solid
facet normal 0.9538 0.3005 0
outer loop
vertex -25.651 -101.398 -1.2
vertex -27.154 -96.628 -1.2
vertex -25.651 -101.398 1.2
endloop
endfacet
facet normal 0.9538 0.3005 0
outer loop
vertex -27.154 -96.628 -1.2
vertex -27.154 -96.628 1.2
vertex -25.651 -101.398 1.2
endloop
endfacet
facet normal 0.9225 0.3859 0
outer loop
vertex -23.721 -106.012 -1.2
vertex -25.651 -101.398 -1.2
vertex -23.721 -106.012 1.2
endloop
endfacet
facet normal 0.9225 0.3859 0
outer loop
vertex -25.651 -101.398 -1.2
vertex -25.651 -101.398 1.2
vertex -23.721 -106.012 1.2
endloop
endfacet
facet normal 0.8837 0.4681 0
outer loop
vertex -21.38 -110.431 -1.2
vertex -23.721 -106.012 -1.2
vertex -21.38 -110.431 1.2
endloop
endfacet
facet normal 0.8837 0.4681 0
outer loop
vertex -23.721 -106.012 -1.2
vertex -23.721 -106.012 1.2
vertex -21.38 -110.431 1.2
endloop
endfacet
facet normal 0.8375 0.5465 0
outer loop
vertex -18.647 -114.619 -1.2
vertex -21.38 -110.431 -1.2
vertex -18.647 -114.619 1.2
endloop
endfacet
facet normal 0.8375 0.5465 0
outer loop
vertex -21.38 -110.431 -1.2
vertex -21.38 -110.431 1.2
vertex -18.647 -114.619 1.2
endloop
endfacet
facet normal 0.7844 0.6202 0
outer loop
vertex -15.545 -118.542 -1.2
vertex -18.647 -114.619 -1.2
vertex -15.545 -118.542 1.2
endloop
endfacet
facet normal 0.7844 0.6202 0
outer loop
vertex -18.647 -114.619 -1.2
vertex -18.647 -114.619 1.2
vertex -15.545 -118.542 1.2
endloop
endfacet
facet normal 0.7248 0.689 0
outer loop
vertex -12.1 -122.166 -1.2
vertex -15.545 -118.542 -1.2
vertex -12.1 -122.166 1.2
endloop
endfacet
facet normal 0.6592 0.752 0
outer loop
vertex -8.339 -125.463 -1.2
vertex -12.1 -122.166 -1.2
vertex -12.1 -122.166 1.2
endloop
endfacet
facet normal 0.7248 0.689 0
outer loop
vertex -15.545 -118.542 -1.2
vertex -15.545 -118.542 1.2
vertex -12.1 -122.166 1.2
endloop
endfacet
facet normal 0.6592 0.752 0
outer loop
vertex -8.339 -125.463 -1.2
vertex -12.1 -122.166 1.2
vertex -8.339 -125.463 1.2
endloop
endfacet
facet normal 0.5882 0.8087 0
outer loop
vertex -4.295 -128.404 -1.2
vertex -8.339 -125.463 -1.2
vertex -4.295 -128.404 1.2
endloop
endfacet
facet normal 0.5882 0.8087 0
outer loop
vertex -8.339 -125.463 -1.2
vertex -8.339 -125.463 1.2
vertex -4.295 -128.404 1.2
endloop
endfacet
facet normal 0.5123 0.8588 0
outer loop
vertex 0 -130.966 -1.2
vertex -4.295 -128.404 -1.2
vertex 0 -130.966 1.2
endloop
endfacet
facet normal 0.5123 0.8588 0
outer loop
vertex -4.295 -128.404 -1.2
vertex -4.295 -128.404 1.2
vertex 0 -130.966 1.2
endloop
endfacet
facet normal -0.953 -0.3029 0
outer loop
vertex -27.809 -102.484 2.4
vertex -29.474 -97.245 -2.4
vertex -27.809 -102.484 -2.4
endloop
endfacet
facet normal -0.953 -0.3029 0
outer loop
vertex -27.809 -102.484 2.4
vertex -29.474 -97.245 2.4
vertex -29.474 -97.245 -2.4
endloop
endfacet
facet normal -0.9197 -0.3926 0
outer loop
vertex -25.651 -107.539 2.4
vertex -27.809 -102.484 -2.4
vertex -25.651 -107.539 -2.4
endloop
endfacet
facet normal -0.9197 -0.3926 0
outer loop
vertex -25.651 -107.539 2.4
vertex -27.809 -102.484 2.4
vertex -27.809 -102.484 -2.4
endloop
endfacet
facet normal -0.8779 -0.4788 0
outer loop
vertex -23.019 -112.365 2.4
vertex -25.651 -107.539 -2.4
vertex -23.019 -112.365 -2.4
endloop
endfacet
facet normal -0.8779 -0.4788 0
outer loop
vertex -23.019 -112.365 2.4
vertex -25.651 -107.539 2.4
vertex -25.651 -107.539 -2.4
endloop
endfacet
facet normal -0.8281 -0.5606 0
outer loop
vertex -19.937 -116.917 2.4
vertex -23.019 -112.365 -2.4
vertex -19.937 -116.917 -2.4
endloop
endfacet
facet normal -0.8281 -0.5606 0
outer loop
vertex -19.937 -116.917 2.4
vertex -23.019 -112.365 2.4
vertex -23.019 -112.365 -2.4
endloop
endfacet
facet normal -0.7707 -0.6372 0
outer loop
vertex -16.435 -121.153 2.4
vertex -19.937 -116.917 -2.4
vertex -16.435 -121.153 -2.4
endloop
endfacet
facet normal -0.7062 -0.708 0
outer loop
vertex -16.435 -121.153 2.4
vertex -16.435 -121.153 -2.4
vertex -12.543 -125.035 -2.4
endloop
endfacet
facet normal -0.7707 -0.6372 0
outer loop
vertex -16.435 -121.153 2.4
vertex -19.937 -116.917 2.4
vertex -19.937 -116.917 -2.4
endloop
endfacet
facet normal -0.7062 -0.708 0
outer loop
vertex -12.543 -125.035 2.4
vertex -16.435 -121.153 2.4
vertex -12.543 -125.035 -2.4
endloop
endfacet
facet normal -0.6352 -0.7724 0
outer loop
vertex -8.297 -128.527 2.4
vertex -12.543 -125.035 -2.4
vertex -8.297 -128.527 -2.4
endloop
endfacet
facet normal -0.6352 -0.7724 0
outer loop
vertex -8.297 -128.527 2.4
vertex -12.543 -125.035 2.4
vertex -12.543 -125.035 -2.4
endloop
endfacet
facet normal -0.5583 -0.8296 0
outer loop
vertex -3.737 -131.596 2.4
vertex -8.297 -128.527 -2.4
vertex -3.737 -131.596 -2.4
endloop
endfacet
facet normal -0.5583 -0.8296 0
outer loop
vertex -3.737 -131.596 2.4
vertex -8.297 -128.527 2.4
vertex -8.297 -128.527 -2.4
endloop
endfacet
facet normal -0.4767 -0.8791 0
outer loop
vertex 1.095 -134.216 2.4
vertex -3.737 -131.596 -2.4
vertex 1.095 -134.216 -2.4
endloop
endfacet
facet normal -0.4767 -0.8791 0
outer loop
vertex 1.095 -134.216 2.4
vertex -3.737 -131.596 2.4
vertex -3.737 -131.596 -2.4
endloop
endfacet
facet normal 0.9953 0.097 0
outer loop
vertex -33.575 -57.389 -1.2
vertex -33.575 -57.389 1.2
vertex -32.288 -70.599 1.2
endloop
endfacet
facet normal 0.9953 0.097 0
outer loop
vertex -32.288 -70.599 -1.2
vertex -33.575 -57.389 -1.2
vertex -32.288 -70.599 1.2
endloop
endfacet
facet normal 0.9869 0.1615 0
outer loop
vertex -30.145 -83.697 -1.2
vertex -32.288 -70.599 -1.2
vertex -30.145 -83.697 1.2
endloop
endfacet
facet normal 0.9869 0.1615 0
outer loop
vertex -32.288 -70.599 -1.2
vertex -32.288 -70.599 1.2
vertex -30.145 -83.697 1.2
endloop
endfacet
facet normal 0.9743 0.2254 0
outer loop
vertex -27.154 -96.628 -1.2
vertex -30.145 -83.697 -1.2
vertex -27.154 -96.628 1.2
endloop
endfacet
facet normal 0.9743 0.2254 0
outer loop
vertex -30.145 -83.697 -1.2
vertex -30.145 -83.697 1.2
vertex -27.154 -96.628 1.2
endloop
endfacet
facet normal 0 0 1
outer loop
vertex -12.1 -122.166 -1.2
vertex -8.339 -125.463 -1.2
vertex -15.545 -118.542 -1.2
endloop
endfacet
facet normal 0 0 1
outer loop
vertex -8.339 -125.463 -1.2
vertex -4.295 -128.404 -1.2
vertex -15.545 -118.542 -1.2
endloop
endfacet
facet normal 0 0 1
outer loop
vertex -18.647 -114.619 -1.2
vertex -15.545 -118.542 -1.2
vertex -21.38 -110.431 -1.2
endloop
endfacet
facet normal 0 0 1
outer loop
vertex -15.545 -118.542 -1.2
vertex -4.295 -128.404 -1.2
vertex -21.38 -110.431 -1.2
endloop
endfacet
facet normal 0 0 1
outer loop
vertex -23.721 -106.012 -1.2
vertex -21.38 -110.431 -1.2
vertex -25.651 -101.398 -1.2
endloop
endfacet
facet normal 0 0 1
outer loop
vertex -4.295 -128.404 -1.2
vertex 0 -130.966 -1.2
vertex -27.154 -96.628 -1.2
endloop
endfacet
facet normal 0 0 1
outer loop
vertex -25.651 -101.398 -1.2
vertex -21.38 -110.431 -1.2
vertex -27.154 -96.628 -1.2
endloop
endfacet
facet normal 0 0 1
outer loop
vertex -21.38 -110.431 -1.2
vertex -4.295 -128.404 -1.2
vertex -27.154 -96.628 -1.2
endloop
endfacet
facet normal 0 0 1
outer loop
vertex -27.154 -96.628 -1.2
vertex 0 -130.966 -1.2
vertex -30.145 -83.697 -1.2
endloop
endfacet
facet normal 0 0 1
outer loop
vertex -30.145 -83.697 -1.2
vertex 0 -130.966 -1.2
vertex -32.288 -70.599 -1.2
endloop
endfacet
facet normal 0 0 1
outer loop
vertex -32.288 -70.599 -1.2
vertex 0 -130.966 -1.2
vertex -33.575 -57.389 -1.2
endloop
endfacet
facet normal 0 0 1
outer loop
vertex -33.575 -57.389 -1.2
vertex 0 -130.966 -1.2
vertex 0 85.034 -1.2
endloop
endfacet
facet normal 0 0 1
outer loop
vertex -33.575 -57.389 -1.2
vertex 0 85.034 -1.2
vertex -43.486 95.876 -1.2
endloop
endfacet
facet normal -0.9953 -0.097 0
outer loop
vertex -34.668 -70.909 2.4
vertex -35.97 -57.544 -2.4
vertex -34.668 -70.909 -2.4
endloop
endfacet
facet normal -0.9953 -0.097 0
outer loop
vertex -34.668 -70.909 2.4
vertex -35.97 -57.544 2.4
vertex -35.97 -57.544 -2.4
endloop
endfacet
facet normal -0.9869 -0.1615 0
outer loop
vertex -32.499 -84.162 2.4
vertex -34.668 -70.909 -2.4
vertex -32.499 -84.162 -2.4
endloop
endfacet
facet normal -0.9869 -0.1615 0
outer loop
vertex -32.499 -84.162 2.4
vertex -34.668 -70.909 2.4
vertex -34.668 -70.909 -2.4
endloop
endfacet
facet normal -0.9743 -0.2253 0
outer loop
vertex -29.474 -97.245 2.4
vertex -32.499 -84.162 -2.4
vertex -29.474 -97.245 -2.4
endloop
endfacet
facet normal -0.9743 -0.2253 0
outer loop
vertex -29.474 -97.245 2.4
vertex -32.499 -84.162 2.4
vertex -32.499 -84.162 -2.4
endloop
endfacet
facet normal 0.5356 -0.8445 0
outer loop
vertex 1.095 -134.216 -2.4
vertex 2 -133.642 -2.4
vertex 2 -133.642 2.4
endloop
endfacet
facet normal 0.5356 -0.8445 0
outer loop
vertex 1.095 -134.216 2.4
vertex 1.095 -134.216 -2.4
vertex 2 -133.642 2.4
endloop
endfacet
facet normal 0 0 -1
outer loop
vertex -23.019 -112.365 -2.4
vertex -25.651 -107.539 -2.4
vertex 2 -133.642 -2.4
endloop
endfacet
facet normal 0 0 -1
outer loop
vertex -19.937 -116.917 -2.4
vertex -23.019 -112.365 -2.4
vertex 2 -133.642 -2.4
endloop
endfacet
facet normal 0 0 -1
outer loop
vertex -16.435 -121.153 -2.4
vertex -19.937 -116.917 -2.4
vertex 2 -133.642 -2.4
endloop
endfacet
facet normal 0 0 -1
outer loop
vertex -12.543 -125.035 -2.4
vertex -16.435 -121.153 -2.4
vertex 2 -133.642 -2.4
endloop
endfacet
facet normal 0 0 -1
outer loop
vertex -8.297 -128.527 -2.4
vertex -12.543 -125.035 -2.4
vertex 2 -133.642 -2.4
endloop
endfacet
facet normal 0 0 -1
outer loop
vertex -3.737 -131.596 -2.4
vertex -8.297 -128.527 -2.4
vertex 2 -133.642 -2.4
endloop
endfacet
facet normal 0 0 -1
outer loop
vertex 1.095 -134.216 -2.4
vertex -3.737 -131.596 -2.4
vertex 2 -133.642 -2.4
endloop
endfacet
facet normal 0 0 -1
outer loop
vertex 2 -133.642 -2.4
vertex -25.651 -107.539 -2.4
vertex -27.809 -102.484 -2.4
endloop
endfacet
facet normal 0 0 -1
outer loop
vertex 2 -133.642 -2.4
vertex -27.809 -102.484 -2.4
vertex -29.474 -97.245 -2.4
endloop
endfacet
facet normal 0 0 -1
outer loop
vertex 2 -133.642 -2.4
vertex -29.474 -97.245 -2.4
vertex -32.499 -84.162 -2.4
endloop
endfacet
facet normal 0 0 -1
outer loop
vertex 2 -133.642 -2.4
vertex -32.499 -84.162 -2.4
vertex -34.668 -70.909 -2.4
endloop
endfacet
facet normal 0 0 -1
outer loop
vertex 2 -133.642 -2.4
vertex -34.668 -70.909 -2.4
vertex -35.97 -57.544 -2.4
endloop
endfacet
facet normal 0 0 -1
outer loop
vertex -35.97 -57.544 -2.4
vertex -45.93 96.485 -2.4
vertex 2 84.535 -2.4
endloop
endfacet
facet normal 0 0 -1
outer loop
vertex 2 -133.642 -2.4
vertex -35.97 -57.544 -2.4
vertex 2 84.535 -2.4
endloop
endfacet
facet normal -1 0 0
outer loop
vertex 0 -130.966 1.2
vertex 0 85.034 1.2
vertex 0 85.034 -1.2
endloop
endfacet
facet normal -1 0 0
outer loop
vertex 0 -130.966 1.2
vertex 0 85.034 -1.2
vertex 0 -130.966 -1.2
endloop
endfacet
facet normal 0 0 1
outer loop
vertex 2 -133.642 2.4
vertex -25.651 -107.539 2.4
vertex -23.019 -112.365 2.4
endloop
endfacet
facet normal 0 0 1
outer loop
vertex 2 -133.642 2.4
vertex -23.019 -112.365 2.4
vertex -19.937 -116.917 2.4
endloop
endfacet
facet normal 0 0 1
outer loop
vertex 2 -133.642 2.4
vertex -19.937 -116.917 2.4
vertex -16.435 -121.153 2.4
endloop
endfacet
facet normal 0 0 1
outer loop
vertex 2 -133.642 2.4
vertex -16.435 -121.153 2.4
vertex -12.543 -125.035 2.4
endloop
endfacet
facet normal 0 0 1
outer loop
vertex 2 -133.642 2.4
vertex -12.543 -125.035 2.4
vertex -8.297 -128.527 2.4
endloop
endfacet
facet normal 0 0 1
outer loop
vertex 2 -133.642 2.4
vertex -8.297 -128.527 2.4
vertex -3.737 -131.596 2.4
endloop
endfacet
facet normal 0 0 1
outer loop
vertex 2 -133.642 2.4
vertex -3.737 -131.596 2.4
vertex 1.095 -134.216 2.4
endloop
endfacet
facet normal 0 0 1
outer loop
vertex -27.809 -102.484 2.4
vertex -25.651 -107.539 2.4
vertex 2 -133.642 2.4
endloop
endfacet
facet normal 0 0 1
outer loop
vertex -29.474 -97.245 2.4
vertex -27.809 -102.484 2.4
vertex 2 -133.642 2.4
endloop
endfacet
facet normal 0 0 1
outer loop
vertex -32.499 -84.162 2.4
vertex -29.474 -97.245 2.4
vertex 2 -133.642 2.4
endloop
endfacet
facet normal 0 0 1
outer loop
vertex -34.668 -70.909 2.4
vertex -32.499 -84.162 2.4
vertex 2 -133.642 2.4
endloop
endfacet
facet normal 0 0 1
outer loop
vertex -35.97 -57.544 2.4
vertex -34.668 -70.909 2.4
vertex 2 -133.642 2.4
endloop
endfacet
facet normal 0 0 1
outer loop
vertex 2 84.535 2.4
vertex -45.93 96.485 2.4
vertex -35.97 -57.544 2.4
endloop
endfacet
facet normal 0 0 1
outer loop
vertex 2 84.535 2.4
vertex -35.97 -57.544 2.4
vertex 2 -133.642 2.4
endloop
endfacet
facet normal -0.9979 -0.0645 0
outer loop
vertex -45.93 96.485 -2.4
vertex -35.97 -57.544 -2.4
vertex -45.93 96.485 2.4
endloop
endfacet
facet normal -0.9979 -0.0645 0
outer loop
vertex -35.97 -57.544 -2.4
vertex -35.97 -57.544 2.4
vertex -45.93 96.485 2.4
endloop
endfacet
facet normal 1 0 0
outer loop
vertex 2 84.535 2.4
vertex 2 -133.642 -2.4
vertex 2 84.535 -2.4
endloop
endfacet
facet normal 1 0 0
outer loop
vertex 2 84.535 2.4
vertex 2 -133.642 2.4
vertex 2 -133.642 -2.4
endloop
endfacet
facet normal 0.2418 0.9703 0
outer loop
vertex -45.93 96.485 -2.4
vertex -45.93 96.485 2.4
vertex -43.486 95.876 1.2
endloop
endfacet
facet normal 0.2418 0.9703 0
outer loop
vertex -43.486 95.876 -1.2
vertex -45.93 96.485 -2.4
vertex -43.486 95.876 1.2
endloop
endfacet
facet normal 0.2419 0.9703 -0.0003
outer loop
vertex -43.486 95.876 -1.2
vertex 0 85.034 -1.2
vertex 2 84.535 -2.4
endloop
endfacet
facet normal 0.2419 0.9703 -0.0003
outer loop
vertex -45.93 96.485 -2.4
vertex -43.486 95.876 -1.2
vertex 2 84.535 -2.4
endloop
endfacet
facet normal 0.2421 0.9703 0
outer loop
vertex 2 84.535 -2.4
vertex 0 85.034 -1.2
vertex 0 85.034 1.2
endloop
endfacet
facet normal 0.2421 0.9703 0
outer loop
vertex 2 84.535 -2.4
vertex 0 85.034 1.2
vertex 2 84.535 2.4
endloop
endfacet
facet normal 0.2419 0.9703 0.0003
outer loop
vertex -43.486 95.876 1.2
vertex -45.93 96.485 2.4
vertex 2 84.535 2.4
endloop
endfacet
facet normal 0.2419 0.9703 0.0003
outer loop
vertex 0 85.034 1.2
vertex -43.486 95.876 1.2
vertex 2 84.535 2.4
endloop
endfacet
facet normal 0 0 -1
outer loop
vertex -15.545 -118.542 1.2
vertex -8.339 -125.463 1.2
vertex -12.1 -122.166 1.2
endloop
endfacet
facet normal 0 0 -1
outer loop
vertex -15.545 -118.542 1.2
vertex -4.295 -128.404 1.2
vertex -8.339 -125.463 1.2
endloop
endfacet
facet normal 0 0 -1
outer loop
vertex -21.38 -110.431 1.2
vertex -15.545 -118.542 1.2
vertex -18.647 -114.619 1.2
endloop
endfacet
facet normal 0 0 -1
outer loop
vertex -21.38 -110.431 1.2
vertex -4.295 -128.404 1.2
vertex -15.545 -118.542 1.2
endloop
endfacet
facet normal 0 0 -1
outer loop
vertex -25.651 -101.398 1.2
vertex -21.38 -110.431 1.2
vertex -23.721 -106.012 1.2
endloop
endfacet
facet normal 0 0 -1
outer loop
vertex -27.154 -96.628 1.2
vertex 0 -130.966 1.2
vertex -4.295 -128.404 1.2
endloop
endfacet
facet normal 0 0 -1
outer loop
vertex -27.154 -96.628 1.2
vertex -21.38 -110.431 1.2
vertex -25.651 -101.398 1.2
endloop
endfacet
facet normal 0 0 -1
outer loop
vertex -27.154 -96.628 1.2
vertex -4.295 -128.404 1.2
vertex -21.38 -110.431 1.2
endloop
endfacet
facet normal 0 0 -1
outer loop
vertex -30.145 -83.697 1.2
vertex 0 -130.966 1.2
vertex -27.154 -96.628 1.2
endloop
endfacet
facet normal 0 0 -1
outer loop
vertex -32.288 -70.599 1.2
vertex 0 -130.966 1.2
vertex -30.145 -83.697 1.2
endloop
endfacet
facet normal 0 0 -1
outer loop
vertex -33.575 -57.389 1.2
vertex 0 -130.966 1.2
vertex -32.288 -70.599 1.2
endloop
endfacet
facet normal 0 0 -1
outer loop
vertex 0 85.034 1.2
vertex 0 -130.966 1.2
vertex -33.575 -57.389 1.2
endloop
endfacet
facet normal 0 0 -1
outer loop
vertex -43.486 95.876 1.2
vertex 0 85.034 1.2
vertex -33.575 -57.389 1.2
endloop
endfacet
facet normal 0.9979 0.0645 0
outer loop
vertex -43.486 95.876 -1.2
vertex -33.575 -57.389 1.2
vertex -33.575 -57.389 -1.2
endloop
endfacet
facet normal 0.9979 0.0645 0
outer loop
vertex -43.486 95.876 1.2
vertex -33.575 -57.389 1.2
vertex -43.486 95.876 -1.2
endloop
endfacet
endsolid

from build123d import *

# Parameters (mm, degrees)
PAD_DEPTH    = 2.4
POCKET_DEPTH = 1.2
CHAMFER_SIZE = 1


with BuildPart() as part:
    # Sketch001 → Pad (new body, symmetric)
    with BuildSketch(Plane.XY):
        with BuildLine():
            ThreePointArc((-35.969784, -57.54415), (-33.691358, -77.55321), (-29.473826, -97.244988))
            ThreePointArc((-29.473826, -97.244988), (-17.916413, -119.460908), (2, -134.64173))
            Line((2, -134.64173), (2, 84.534861))
            Line((-45.930419, 96.485256), (2, 84.534861))
            Line((-35.969784, -57.54415), (-45.930419, 96.485256))
        make_face()
    extrude(amount=PAD_DEPTH, both=True)

    # Sketch → Pocket (cut, symmetric)
    with BuildSketch(Plane.XY):
        with BuildLine():
            Line((0, 85.033517), (0, -130.966483))
            ThreePointArc((-27.154362, -96.628473), (-17.140793, -116.615568), (0, -130.966483))
            ThreePointArc((-33.574786, -57.389272), (-31.322854, -77.165669), (-27.154362, -96.628473))
            Line((-33.574786, -57.389272), (-43.485993, 95.875793))
            Line((-43.485993, 95.875793), (0, 85.033517))
        make_face()
    extrude(amount=POCKET_DEPTH, both=True, mode=Mode.SUBTRACT)

    # Chamfer
    chamfer_edges = [part.edges().sort_by_distance(p)[0] for p in [
        (2, -134.64173, 0),
    ]]
    chamfer(chamfer_edges, length=CHAMFER_SIZE)


solid = part.part
